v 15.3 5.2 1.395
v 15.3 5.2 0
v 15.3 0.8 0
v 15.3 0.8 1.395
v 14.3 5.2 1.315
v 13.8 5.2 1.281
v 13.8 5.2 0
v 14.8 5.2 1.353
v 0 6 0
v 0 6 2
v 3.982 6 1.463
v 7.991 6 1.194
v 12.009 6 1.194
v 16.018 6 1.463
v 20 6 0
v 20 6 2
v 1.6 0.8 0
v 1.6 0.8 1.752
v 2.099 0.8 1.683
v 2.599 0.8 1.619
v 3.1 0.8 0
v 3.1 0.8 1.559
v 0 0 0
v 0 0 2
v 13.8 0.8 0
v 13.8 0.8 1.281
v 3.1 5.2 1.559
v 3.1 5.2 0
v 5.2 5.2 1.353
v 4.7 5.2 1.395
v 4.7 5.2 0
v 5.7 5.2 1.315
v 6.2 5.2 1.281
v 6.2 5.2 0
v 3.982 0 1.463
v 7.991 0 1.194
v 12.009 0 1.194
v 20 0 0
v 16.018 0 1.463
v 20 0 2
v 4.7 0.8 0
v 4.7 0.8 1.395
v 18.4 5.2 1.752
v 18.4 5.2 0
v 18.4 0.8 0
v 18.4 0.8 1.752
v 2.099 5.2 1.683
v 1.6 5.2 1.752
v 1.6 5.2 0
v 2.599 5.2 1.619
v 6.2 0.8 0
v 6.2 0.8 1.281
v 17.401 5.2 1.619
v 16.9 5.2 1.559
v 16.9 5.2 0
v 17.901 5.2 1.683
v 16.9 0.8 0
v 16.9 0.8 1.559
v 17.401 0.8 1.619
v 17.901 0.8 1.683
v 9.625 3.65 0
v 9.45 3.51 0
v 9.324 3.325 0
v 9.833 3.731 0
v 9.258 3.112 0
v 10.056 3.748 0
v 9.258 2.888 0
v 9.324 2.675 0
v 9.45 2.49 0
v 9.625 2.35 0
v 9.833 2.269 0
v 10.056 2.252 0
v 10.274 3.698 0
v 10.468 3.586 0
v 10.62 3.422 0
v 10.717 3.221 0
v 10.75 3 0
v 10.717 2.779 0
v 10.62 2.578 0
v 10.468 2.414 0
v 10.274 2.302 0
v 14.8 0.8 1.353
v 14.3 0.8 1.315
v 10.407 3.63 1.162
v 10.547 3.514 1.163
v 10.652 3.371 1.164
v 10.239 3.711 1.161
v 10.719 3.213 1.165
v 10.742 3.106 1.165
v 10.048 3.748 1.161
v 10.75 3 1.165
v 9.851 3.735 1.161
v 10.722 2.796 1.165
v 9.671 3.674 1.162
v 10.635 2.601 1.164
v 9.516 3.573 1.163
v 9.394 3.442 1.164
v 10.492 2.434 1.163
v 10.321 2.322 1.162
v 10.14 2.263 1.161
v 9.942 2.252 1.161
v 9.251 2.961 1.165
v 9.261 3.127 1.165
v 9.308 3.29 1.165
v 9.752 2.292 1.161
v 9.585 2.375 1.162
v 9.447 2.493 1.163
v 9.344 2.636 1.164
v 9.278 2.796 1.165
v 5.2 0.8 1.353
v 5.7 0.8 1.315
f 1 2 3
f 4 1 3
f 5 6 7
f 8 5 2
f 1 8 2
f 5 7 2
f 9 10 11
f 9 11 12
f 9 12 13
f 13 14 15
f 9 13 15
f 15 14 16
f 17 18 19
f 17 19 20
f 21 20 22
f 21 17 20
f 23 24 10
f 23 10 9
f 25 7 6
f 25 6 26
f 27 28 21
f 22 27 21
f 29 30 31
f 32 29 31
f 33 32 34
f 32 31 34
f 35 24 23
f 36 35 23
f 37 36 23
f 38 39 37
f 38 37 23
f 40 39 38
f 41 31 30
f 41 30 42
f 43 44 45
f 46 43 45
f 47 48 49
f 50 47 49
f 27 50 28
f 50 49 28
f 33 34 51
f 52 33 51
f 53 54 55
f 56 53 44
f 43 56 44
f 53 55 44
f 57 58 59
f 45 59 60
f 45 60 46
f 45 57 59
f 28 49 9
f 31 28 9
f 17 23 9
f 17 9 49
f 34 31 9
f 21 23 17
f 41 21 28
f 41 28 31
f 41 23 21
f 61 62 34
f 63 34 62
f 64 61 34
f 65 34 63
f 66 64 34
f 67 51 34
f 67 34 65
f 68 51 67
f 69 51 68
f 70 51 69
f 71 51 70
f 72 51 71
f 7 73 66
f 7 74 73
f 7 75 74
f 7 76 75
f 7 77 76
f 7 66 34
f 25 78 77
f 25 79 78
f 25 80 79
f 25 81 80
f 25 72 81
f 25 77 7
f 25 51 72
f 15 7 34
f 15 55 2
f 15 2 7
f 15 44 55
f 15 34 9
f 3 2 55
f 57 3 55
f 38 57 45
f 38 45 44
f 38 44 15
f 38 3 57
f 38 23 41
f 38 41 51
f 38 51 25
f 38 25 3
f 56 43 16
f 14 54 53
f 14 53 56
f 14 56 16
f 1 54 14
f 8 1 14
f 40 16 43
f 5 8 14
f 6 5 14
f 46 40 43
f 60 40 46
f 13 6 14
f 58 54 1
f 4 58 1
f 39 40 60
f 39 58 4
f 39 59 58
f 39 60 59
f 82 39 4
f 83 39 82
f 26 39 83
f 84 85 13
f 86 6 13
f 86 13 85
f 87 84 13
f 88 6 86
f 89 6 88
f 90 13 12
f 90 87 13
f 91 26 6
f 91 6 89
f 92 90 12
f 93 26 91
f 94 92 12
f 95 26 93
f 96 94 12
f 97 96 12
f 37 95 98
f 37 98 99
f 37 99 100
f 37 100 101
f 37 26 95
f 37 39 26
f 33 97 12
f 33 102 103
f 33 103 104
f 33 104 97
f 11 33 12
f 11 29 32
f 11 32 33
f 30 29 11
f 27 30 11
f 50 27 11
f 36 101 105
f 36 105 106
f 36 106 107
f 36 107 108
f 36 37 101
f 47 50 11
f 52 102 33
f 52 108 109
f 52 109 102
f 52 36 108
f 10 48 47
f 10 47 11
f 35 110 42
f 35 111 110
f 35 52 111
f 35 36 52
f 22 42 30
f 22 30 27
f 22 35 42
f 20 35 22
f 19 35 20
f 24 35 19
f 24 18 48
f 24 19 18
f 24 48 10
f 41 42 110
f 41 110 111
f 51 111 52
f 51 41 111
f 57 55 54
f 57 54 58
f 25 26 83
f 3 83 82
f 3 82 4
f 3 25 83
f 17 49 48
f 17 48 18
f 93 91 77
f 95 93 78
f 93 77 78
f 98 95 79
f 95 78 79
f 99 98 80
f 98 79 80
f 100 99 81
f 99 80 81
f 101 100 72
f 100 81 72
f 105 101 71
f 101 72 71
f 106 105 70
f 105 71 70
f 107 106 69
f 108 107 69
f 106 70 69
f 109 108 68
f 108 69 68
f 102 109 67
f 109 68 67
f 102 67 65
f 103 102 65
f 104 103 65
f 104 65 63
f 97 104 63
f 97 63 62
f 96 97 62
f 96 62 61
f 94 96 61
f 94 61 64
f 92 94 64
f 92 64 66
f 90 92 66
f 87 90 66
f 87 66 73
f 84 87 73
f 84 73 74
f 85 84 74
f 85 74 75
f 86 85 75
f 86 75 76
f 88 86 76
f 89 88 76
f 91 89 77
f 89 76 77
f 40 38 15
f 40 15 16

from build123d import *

# Parameters (mm, degrees)
F1_DEPTH = 6
F2_R     = 0.75
F3_DEPTH = 25
F4_W     = 1.5
F4_H     = 4.4
F5_DEPTH = 25


with BuildPart() as f1:
    # F0 (on Front) → F1 (new body)
    with BuildSketch(Plane.XZ):
        with BuildLine():
            Line((0, 2), (0, 0))
            Line((0, 0), (20, 0))
            Line((20, 0), (20, 2))
            ThreePointArc((20, 2), (10, 1.160798), (0, 2))
        make_face()
    extrude(amount=-F1_DEPTH)

    # F2 (on face) → F3 (cut)
    with BuildSketch(Plane(origin=(0, 0, 0), x_dir=(1, 0, 0), z_dir=(0, 0, -1))):
        with Locations((10, -3)):
            Circle(F2_R)
    extrude(amount=-F3_DEPTH, mode=Mode.SUBTRACT)

    # F4 (on face) → F5 (cut)
    with BuildSketch(Plane(origin=(0, 0, 0), x_dir=(1, 0, 0), z_dir=(0, 0, -1))):
        with Locations((5.45, -3)):
            Rectangle(F4_W, F4_H)
        with Locations((2.35, -3)):
            Rectangle(F4_W, F4_H)
        with Locations((14.55, -3)):
            Rectangle(F4_W, F4_H)
        with Locations((17.65, -3)):
            Rectangle(F4_W, F4_H)
    extrude(amount=-F5_DEPTH, mode=Mode.SUBTRACT)


solid = f1.part
